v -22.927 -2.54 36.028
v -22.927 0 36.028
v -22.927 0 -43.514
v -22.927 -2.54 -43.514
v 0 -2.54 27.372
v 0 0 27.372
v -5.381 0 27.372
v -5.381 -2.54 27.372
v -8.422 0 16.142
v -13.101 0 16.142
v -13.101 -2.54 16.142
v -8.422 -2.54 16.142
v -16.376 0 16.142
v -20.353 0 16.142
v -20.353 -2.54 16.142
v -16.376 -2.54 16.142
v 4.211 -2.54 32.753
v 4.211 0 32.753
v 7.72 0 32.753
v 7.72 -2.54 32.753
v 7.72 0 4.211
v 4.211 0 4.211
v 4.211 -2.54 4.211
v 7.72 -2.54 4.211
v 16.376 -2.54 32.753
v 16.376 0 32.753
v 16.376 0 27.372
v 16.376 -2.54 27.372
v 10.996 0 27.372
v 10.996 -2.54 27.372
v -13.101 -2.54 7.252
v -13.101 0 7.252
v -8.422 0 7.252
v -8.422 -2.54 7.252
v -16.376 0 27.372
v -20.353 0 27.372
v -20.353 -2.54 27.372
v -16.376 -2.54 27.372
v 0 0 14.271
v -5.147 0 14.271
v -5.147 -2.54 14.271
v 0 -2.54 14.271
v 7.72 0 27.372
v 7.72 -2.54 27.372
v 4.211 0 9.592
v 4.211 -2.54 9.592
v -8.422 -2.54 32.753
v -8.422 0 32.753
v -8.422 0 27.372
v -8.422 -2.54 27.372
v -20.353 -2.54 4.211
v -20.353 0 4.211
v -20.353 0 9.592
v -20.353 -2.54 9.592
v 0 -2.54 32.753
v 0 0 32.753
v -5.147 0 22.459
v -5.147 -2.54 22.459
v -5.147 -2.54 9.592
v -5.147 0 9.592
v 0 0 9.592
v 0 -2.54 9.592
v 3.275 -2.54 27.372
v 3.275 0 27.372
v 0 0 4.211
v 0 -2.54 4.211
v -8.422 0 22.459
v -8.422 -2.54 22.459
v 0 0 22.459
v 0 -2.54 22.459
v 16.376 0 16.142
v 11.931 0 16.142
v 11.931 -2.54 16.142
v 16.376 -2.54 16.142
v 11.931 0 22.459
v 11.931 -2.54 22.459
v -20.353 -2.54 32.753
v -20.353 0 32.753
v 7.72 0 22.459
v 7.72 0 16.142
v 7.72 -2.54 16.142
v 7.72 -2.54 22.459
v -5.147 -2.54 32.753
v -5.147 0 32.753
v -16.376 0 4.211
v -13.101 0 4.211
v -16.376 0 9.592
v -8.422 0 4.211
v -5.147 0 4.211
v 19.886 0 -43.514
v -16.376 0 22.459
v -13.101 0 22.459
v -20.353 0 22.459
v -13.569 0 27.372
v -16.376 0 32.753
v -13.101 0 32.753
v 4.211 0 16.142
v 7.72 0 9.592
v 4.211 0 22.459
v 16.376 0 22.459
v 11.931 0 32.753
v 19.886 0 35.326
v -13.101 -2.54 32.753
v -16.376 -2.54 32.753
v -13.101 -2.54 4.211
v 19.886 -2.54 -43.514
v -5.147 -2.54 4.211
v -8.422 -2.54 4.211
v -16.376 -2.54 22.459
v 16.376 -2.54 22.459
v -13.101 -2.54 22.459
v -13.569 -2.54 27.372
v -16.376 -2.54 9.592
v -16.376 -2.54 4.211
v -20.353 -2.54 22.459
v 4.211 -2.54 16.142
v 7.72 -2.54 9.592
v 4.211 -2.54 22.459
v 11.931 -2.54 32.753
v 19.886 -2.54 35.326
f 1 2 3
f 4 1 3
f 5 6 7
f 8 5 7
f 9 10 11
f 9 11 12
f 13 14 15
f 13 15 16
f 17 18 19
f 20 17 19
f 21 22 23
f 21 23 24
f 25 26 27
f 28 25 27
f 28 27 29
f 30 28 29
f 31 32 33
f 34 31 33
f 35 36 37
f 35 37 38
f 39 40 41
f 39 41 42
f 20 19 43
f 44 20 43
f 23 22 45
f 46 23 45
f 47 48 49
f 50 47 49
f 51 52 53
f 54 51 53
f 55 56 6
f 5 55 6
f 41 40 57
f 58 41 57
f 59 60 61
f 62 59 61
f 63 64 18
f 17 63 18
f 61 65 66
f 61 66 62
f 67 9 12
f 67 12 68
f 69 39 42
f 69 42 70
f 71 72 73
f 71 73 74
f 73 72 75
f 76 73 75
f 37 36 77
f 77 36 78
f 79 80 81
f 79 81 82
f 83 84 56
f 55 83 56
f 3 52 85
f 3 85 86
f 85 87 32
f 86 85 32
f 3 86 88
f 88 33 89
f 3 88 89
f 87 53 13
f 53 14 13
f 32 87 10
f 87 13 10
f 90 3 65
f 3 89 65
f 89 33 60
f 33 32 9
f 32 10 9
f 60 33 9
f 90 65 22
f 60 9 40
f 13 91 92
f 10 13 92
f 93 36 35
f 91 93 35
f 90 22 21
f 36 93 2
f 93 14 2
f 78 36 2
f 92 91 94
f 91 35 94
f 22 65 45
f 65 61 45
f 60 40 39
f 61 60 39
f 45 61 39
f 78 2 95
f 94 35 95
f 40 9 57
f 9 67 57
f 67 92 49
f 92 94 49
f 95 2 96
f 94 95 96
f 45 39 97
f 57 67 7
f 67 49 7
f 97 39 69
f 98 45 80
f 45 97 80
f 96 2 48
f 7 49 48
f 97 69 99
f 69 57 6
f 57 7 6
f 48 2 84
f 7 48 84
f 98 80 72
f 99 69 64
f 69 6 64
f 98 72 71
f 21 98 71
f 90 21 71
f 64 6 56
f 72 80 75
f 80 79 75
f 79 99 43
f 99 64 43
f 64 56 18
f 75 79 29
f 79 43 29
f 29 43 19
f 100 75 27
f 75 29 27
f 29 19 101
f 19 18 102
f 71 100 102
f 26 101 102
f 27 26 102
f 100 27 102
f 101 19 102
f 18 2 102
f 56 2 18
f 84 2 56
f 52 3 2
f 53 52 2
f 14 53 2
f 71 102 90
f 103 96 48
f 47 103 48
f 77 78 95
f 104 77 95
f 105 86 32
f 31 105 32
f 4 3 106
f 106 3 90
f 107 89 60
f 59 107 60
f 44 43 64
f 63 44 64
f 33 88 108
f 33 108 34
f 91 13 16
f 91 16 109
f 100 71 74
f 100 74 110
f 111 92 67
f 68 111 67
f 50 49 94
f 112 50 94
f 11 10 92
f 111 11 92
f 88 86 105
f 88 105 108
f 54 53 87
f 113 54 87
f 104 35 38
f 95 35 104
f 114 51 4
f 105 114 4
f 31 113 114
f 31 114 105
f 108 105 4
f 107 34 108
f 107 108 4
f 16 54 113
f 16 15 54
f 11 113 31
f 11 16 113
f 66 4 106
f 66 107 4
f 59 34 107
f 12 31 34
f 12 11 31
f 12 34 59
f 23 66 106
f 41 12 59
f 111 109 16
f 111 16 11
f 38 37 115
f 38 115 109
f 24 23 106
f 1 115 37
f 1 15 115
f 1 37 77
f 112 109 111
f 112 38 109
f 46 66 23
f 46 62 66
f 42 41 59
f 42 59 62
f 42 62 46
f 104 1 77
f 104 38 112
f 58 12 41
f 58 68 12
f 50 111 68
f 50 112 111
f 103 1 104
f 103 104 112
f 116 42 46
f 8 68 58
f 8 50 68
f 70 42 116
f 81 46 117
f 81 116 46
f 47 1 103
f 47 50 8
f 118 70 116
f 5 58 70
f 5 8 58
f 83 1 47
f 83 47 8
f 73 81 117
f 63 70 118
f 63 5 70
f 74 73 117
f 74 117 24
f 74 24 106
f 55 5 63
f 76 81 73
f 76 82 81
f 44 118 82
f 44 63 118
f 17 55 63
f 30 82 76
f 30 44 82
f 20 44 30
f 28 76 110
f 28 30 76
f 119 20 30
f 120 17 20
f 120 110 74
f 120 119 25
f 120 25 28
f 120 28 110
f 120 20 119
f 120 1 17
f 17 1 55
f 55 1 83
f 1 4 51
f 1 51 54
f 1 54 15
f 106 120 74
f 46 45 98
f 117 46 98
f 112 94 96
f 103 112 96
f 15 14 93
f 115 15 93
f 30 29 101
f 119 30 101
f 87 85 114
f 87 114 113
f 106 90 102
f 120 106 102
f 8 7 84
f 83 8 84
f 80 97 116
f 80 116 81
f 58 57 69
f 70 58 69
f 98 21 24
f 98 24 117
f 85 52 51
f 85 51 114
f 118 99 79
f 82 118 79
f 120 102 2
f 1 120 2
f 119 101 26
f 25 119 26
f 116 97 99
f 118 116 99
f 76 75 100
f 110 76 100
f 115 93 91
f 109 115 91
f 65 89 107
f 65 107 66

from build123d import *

# Parameters (mm, degrees)
F0_W     = 3.977105
F0_H     = 5.380789
F0_W_2   = 4.678948
F0_H_2   = 3.041315
F0_W_3   = 5.146842
F0_H_3   = 6.31658
F0_H_4   = 5.380787
F0_H_5   = 8.188158
F0_W_4   = 3.509209
F0_W_5   = 4.444998
F0_R     = 4.004533
F1_DEPTH = 2.54


with BuildPart() as f1:
    # F0 (on Front) → F1 (new body)
    with BuildSketch(Plane.XZ):
        Polygon((19.885525, -32.050792), (19.885525, 35.326052), (-22.926843, 36.027897), (-22.926843, -31.348947), align=None)
        with Locations((-18.364869, 6.901447)):
            Rectangle(F0_W, F0_H, mode=Mode.SUBTRACT)
        with Locations((-10.761579, 5.731711)):
            Rectangle(F0_W_2, F0_H_2, mode=Mode.SUBTRACT)
        with Locations((-2.573421, 6.901447)):
            Rectangle(F0_W_3, F0_H, mode=Mode.SUBTRACT)
        with Locations((-18.364869, 19.300658)):
            Rectangle(F0_W, F0_H_3, mode=Mode.SUBTRACT)
        with Locations((-18.364869, 30.062235)):
            Rectangle(F0_W, F0_H_4, mode=Mode.SUBTRACT)
        with Locations((-10.761579, 19.300658)):
            Rectangle(F0_W_2, F0_H_3, mode=Mode.SUBTRACT)
        with Locations((-2.573421, 18.364869)):
            Rectangle(F0_W_3, F0_H_5, mode=Mode.SUBTRACT)
        Polygon((-13.568947, 27.371842), (-13.101053, 32.752629), (-8.422105, 32.752629), (-8.422105, 27.371842), align=None, mode=Mode.SUBTRACT)
        Polygon((-5.38079, 27.371842), (-5.146842, 32.752629), (0, 32.752629), (0, 27.371842), align=None, mode=Mode.SUBTRACT)
        with Locations((5.965658, 6.901447)):
            Rectangle(F0_W_4, F0_H, mode=Mode.SUBTRACT)
        with Locations((5.965658, 19.300658)):
            Rectangle(F0_W_4, F0_H_3, mode=Mode.SUBTRACT)
        Polygon((3.275263, 27.371842), (4.211054, 32.752629), (7.720263, 32.752629), (7.720263, 27.371842), align=None, mode=Mode.SUBTRACT)
        with Locations((14.153816, 19.300658)):
            Rectangle(F0_W_5, F0_H_3, mode=Mode.SUBTRACT)
        Polygon((10.995527, 27.371842), (11.931317, 32.752629), (16.376315, 32.752629), (16.376315, 27.371842), align=None, mode=Mode.SUBTRACT)
        Polygon((19.885525, -43.514211), (19.885525, -32.050792), (-22.926843, -31.348947), (-22.926843, -43.514211), align=None)
        with Locations((0, -37.665527)):
            Circle(F0_R, mode=Mode.SUBTRACT)
        with Locations((0, -37.665527)):
            Circle(F0_R)
    extrude(amount=F1_DEPTH)


solid = f1.part
